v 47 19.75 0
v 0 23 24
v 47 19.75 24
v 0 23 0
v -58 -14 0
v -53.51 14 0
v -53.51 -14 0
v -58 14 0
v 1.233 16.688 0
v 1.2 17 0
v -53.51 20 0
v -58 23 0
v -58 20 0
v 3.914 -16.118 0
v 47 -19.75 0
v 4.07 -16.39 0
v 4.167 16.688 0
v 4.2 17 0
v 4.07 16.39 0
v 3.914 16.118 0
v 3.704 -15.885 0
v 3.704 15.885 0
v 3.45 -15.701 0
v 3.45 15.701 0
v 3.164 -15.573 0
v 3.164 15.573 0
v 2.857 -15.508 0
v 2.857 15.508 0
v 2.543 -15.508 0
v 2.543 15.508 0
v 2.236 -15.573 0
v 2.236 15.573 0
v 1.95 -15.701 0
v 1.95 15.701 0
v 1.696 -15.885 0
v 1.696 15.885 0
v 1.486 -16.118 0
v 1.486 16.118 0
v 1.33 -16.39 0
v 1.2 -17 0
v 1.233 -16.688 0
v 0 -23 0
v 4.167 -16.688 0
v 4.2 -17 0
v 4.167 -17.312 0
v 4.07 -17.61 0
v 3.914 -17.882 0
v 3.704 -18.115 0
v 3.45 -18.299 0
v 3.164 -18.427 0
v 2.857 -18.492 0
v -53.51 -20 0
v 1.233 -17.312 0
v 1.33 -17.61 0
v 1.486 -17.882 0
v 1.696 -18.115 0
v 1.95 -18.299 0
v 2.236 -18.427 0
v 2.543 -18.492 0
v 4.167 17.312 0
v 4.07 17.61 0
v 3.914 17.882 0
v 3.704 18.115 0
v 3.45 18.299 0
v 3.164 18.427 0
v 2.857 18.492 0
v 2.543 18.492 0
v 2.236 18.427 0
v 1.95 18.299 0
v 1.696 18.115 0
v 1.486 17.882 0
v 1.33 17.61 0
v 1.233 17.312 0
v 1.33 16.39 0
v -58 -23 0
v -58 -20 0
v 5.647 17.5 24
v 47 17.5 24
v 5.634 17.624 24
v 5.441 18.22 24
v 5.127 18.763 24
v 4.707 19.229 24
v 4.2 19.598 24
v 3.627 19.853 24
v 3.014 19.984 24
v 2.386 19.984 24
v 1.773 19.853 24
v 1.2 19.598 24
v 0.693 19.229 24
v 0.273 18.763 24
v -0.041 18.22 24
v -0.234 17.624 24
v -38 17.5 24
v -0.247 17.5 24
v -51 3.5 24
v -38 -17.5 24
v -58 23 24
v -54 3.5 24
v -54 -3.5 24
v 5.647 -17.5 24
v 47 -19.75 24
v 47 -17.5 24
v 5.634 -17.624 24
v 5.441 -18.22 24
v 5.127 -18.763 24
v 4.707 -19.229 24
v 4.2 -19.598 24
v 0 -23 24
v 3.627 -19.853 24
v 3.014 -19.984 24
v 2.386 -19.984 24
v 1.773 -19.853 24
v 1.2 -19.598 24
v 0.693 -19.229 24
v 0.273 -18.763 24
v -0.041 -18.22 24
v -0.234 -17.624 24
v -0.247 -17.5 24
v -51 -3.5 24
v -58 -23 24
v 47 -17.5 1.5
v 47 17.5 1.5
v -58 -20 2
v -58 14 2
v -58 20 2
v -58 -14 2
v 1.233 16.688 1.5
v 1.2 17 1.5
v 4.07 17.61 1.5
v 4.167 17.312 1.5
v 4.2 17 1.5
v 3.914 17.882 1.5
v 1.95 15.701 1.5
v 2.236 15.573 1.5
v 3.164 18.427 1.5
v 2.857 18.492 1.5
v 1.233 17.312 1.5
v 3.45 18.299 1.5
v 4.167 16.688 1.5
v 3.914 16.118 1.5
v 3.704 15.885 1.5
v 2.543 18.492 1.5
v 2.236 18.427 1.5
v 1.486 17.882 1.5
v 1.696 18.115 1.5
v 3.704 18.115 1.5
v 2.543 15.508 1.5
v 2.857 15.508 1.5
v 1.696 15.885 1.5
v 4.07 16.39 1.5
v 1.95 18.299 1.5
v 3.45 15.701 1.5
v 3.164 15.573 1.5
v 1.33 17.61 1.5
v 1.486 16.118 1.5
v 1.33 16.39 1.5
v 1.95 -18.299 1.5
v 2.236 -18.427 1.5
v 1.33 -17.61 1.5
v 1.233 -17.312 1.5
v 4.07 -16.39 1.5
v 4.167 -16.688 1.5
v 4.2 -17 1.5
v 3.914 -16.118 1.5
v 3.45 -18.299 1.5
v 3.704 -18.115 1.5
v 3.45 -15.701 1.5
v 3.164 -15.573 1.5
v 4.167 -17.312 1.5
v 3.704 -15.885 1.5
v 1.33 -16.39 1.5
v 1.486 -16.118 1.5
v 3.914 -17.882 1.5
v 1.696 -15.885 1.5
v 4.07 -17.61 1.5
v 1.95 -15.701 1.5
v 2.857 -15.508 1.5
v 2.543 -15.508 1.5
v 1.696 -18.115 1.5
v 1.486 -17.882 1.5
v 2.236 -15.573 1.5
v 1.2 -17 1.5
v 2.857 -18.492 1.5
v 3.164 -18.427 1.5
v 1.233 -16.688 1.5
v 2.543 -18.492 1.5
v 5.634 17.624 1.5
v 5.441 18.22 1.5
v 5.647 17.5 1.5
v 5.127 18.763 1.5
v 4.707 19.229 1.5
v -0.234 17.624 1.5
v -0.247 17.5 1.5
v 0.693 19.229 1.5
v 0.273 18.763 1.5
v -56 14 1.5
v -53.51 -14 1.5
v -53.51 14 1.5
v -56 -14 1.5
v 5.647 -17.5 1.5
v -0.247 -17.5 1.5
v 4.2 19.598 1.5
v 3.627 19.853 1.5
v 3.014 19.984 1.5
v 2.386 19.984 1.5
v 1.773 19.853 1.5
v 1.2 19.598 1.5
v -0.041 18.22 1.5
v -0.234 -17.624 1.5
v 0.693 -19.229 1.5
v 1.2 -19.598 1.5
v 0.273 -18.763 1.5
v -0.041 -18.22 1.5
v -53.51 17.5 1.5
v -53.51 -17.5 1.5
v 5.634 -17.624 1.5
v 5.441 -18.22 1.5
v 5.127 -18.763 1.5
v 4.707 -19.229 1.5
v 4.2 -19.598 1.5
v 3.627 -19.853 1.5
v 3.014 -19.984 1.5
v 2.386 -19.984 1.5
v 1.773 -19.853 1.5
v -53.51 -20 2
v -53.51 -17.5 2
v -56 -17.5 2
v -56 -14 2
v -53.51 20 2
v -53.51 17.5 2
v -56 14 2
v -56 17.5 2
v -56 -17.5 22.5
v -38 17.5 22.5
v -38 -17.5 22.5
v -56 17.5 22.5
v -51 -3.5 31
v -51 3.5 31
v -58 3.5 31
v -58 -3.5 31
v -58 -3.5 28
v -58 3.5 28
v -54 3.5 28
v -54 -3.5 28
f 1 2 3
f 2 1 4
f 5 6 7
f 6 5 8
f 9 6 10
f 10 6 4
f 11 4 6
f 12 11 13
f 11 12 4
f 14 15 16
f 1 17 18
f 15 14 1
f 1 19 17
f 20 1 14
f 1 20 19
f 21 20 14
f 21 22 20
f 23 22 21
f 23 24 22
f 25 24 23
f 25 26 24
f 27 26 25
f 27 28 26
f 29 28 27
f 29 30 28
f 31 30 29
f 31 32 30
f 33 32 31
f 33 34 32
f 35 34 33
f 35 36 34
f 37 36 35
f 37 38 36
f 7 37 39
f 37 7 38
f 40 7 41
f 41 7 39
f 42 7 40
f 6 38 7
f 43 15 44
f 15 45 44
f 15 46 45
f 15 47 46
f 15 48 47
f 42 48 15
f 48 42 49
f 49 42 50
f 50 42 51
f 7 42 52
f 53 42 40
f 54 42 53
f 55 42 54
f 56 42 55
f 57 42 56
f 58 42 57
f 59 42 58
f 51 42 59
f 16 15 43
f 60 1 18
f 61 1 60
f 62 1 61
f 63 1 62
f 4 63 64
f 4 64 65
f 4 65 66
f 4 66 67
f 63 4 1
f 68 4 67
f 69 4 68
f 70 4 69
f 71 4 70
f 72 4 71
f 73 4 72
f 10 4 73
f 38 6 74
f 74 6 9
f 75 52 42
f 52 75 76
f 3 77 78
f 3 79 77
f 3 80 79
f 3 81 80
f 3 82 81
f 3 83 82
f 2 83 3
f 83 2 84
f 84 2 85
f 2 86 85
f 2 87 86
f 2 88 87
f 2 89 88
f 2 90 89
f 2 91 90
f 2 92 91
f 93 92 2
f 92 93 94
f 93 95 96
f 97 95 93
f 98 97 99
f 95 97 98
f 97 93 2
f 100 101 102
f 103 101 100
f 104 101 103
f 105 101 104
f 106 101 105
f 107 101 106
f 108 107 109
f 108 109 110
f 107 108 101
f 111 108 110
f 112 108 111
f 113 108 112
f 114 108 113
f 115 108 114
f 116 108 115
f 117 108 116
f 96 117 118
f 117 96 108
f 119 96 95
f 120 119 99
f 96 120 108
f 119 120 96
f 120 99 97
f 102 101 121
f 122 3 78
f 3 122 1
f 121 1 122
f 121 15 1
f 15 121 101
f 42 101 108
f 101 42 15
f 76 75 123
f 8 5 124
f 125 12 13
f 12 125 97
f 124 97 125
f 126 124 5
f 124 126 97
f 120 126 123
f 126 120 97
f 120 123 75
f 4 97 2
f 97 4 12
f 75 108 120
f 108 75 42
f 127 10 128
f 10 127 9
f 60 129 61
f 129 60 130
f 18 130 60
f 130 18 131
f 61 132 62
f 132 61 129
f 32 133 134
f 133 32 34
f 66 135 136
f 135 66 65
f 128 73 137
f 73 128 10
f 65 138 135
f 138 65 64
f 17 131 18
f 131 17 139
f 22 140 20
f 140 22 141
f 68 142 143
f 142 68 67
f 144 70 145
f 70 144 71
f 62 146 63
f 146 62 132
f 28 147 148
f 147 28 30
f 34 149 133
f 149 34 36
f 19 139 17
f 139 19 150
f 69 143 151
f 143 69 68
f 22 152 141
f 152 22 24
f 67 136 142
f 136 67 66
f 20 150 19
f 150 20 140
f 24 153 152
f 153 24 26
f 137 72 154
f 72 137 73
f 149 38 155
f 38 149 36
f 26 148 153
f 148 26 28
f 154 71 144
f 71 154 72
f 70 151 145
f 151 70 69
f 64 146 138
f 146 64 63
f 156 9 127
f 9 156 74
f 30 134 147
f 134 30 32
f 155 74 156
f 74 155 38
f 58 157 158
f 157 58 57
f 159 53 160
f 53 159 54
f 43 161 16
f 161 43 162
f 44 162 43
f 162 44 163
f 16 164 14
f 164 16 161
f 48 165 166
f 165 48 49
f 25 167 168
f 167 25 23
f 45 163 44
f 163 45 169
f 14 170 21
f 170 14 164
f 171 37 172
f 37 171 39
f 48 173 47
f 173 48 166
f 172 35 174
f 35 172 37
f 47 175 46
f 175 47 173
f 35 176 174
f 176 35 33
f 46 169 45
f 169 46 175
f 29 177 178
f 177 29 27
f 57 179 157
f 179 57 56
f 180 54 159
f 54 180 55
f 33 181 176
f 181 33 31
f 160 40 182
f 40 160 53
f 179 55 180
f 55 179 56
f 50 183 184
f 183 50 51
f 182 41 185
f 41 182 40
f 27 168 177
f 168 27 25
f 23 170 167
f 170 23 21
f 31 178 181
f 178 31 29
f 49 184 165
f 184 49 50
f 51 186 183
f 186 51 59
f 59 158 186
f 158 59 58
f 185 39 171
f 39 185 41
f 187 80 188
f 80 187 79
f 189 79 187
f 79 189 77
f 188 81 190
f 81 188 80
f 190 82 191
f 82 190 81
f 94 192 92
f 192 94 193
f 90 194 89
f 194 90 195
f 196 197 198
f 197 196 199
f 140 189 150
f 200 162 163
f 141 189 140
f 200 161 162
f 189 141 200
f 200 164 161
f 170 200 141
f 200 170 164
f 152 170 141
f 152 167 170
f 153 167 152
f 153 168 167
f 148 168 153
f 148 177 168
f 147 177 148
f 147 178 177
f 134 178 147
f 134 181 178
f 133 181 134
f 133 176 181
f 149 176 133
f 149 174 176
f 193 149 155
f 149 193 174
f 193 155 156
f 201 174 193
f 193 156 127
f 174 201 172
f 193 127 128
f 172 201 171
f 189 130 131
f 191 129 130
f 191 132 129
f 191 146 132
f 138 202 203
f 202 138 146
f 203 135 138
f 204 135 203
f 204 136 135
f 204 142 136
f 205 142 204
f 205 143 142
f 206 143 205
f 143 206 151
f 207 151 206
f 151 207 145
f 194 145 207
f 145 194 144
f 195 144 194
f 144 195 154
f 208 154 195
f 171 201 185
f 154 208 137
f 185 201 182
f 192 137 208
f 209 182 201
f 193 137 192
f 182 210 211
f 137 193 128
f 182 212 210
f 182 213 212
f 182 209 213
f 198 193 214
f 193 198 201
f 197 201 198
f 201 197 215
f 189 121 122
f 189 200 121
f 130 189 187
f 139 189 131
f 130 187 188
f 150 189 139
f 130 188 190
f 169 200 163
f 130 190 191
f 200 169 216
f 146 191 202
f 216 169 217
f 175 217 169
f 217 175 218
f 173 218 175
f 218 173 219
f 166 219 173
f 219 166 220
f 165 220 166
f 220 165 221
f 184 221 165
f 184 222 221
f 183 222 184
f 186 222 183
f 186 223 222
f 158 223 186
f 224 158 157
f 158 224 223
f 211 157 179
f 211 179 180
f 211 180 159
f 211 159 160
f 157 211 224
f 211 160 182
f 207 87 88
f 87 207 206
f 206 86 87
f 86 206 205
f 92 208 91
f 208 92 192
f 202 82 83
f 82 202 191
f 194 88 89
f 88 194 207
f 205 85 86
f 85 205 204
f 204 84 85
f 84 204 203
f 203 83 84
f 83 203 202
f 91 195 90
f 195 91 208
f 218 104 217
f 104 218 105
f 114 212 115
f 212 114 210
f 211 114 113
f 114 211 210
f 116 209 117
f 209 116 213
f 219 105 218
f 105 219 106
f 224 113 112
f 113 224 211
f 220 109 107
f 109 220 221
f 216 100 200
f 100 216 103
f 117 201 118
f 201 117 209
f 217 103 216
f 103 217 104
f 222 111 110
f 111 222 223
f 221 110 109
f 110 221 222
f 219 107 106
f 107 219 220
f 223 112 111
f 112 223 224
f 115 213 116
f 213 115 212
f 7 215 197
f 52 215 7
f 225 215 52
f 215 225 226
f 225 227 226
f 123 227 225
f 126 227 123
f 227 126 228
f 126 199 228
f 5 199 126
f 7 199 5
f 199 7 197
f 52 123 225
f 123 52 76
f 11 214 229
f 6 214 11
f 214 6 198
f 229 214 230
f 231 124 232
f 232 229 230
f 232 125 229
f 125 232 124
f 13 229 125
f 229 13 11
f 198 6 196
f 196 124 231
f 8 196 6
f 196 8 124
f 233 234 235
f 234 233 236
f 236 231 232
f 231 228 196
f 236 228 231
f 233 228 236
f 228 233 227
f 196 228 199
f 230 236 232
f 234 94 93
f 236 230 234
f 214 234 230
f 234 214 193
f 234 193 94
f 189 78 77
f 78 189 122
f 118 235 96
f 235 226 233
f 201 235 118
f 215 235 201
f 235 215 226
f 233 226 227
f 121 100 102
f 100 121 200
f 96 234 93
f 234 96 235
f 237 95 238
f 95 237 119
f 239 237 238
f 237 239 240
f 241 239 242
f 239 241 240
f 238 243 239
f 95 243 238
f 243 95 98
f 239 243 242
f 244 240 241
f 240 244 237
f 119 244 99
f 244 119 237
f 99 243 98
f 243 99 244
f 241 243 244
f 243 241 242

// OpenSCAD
include_strap_tab="Yes";//[Yes,No]
battery_height=21;//[1:100]
battery_width=35;//[1:36]
/* [Hidden] */
$fn=30;

frame_width_max=46;
frame_width_min=39.5;

module battery(){
    translate([-56,-battery_width/2,1.5]){
        cube([103.01,battery_width,battery_height]);
    }
}
module base_mount(){
    linear_extrude(height=battery_height+3)
        polygon(points=[[0,frame_width_max/2],[0,-frame_width_max/2],[47,-frame_width_min/2],[47,frame_width_min/2]],paths=[[0,1,2,3]]);
    translate([-58,-frame_width_max/2,0]){
    cube([58,frame_width_max,battery_height+3]);
    }
}
module strap_tab(){
    difference(){
        cube([7,7,7]);
        translate([-0.01,-0.01,-0.01])cube([4.01,7.02,4.01]);
    }
}
module screw_holes(){
    translate([2.7,17,-0.01])cylinder(h=1.52,r=1.5);
    translate([2.7,-17,-0.01])cylinder(h=1.52,r=1.5);
    translate([2.7,17,1.5])cylinder(h=battery_height+1.51,r=3);
    translate([2.7,-17,1.5])cylinder(h=battery_height+1.51,r=3);
    translate([-58.01,-20,-0.01])cube([4.5,6,2.01]);
    translate([-58.01,14,-0.01])cube([4.5,6,2.01]);
}
module top_hole(){
    translate([-38,-battery_width/2,battery_height+1.49])cube([85.01,battery_width,1.52]);
}
difference(){
    base_mount();
    screw_holes();
    battery();
    top_hole();
}
if (include_strap_tab=="Yes") {
    translate([-58,-3.5,battery_height+3])strap_tab();
}
